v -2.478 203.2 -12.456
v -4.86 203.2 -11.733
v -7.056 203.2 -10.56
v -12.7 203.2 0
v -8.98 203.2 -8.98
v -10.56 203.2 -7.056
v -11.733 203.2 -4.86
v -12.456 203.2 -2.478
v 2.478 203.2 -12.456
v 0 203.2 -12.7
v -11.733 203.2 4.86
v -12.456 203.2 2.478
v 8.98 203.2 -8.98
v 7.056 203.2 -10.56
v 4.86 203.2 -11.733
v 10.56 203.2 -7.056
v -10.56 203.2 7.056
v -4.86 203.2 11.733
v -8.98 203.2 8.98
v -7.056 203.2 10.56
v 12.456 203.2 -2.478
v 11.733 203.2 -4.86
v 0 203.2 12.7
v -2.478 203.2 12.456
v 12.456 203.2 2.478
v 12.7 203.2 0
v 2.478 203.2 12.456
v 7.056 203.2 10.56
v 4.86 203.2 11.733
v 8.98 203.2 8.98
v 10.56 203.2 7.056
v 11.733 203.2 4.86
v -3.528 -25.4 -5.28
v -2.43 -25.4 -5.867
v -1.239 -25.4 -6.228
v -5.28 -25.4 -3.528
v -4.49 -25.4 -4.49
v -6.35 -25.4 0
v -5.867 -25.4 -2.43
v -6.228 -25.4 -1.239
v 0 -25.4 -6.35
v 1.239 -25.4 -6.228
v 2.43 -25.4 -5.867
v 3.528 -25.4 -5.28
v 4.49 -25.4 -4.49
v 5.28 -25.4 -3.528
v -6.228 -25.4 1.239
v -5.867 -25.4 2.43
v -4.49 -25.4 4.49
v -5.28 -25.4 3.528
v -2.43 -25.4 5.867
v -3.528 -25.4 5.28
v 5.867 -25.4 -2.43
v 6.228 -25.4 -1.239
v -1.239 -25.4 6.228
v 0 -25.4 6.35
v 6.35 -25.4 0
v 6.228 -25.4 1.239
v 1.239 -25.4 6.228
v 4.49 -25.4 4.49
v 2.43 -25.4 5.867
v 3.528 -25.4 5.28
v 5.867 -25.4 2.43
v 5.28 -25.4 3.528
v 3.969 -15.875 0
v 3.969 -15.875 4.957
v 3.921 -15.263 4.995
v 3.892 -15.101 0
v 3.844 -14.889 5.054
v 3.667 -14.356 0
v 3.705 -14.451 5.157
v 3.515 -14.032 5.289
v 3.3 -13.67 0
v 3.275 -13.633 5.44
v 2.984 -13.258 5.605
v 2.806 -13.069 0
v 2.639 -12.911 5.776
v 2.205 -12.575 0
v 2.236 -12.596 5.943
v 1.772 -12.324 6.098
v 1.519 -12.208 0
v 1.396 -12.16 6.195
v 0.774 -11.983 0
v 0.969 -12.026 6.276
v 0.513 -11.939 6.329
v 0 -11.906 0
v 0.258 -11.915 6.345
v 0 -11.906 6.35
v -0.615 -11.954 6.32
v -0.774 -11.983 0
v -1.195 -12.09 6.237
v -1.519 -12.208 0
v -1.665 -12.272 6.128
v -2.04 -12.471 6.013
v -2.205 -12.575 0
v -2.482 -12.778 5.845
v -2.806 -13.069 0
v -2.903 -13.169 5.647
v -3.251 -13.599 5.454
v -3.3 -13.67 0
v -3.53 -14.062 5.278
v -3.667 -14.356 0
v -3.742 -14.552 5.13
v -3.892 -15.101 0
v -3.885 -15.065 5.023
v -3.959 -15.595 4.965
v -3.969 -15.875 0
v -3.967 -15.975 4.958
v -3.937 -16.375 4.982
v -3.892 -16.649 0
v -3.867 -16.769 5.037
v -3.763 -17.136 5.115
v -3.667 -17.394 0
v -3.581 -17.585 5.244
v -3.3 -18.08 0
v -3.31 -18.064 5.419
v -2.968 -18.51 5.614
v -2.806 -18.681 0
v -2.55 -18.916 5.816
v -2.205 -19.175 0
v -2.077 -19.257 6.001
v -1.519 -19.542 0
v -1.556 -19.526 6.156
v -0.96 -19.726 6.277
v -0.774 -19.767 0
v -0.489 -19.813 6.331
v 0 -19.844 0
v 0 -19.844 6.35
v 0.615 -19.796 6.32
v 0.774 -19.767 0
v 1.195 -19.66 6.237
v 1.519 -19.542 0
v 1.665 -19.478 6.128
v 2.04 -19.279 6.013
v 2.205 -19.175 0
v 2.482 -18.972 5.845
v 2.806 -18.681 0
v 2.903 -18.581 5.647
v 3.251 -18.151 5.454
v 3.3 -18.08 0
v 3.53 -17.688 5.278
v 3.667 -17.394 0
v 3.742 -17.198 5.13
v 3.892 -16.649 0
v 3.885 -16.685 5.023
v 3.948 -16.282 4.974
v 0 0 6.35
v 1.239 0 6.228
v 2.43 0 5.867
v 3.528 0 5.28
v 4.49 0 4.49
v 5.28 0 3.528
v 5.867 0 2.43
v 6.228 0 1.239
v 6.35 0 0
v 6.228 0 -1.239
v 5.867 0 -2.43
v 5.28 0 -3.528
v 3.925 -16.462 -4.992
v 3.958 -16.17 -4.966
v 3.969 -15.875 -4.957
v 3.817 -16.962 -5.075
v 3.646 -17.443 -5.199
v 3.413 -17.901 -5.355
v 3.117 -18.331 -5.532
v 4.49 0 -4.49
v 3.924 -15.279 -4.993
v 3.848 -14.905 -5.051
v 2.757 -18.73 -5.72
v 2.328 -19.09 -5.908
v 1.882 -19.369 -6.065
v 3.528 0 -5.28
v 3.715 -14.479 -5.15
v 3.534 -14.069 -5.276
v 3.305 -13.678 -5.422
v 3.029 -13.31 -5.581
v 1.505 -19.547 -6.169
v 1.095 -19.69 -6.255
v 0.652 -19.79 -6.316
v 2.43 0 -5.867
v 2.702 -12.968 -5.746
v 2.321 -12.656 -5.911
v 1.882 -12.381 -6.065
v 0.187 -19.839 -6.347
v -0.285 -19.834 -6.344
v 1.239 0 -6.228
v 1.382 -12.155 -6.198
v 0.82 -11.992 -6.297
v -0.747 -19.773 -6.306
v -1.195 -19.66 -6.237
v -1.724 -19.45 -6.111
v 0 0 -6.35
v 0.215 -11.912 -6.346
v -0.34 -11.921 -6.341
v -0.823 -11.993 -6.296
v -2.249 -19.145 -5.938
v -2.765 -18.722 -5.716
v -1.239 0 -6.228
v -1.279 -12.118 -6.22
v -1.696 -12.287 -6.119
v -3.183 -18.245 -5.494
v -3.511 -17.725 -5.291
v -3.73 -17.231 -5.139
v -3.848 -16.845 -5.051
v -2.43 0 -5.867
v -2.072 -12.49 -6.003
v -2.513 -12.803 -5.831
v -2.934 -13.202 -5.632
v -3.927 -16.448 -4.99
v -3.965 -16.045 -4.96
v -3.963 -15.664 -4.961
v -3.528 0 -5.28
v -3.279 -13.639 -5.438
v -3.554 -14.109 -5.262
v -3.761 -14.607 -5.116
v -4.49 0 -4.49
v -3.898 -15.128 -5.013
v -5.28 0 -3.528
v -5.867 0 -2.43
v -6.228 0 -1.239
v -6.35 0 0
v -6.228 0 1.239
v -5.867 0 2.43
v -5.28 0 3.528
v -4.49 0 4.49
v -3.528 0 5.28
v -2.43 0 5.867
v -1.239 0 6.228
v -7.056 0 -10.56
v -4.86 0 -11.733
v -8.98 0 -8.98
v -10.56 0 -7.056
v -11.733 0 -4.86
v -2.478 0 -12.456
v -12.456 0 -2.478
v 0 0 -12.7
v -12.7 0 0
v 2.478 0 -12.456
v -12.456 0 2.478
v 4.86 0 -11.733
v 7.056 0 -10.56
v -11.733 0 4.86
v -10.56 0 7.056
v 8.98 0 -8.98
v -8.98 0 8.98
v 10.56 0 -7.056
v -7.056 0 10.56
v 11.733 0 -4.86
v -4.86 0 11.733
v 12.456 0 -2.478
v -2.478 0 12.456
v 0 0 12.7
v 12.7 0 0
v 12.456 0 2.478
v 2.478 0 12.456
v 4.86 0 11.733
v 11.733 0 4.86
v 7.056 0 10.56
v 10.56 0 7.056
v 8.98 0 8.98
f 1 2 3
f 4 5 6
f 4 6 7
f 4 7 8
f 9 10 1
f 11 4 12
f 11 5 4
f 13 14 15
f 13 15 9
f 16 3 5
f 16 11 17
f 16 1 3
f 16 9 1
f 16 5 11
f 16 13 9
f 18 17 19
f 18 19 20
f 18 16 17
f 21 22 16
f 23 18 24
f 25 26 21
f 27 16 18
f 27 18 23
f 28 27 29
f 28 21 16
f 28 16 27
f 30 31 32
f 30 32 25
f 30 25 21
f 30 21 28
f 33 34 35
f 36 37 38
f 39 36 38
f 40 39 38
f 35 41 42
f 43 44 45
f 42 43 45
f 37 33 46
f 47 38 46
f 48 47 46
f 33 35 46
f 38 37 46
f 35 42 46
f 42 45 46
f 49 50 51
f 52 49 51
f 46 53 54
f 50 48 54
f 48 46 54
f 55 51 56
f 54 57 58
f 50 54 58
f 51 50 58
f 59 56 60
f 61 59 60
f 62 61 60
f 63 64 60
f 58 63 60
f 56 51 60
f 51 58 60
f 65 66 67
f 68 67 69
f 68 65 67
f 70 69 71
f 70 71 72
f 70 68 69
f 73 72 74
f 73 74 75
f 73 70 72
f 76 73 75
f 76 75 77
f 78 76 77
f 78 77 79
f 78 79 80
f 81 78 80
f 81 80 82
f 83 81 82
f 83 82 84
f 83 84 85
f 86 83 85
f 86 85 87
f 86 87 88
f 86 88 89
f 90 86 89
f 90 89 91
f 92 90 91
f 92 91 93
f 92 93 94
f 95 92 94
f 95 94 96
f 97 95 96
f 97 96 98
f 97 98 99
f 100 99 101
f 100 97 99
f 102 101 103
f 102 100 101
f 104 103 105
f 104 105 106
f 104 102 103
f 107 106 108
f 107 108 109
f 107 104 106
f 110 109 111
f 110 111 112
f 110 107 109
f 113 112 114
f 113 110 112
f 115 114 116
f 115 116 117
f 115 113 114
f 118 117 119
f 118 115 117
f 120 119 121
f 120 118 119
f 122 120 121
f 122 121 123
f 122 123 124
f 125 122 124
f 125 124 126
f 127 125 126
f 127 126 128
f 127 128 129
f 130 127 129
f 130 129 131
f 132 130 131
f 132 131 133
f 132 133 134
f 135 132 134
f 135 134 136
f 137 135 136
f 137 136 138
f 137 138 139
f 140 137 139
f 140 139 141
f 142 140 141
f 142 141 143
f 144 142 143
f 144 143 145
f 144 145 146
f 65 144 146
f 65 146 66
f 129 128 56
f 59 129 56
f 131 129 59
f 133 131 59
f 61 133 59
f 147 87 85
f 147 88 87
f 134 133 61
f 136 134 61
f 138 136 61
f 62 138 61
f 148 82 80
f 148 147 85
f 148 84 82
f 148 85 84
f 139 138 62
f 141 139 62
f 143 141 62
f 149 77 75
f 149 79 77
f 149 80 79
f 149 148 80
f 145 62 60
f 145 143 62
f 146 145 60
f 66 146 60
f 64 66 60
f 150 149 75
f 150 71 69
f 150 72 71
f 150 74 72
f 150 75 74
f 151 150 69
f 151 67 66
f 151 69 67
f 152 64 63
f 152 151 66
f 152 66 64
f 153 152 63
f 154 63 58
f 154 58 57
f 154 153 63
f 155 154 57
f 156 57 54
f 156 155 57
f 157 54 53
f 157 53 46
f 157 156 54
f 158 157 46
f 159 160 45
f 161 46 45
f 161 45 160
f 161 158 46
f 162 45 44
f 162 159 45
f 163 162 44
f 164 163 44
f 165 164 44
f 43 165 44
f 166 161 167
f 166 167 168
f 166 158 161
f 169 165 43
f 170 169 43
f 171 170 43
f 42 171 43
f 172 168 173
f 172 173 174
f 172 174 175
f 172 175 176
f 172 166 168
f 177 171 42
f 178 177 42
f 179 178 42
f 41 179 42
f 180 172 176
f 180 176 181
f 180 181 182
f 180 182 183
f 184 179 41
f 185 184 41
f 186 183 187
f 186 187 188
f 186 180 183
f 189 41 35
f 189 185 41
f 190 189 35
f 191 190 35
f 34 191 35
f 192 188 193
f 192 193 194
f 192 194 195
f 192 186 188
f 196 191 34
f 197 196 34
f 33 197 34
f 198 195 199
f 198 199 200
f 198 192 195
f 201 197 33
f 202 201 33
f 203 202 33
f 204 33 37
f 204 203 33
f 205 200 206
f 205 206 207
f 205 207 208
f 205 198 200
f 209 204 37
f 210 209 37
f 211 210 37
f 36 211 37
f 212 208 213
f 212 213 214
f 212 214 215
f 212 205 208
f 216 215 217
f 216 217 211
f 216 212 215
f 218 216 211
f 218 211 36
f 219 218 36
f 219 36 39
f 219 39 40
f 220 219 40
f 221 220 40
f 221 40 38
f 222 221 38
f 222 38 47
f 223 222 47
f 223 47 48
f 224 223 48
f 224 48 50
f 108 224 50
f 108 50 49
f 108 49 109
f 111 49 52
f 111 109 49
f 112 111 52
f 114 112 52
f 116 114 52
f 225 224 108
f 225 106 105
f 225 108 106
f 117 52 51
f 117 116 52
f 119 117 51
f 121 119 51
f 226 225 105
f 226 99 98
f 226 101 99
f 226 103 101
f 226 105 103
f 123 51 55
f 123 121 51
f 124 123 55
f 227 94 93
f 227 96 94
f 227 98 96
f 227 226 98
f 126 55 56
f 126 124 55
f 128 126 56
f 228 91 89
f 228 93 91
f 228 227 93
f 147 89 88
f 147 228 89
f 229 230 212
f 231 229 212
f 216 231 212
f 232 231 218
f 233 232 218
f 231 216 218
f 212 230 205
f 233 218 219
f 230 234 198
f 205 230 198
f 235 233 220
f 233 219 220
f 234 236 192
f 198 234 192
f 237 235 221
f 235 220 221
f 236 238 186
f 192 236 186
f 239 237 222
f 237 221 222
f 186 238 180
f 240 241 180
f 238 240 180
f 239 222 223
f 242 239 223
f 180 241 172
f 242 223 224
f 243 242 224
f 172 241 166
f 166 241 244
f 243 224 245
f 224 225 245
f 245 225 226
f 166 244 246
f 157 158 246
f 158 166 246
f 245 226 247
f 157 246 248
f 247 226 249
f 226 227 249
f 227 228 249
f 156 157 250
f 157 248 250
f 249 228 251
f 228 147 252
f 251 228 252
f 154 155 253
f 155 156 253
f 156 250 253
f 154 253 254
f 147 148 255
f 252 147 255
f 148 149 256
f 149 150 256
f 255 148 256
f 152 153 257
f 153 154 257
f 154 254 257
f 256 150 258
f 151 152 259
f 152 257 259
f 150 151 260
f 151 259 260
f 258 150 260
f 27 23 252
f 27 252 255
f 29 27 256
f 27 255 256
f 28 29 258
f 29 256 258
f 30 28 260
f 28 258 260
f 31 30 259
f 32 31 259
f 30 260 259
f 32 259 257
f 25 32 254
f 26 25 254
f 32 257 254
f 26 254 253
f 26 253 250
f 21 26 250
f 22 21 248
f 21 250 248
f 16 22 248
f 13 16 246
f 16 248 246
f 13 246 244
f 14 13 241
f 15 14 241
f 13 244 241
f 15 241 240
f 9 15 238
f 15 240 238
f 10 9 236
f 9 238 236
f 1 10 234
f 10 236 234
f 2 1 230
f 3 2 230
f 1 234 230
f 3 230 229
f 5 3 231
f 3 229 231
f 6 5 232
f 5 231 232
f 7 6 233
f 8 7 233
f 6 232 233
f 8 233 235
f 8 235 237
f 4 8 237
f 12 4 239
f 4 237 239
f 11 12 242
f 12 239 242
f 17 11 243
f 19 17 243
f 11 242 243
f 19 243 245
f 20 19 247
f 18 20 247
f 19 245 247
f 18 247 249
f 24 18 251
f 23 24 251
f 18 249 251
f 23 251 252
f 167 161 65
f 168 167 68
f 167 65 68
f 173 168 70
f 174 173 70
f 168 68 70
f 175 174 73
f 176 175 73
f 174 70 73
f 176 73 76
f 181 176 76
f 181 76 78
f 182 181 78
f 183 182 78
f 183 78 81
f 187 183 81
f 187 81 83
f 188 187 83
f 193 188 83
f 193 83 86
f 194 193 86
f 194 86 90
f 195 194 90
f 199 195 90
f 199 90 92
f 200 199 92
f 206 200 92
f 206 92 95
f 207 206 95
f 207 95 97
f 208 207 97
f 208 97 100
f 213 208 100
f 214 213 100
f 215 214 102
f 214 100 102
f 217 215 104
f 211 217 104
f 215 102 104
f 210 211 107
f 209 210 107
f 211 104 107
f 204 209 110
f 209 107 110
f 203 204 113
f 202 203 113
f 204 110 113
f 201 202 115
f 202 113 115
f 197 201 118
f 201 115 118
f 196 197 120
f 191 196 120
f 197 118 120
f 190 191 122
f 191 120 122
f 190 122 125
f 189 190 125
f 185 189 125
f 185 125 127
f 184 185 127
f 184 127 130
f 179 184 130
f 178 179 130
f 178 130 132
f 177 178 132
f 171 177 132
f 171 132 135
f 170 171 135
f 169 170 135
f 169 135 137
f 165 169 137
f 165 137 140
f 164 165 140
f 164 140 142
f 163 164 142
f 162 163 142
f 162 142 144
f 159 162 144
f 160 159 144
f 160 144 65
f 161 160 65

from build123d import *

# Parameters (mm, degrees)
SKETCH1_R               = 12.7
BOSS_EXTRUDE1_DEPTH     = 203.2
SKETCH1_3_R             = 6.35
BOSS_EXTRUDE2_DEPTH     = 25.4
CUT_EXTRUDE2_DEPTH      = 204.992205733
CUT_EXTRUDE2_DEPTH_BACK = 204.992205733
SKETCH3_R               = 3.96875


with BuildPart() as part:
    # Sketch1 → Boss-Extrude1 (new body)
    with BuildSketch(Plane(origin=(0, 0, 0), x_dir=(1, 0, 0), z_dir=(0, 1, 0))):
        Circle(SKETCH1_R)
    extrude(amount=BOSS_EXTRUDE1_DEPTH)

    # Sketch1<3> → Boss-Extrude2 (add)
    with BuildSketch(Plane(origin=(0, 0, 0), x_dir=(1, 0, 0), z_dir=(0, 1, 0))):
        Circle(SKETCH1_3_R)
    extrude(amount=-BOSS_EXTRUDE2_DEPTH)

    # Sketch3 → Cut-Extrude2 (cut, two sides: drawn at the far end of the back side and taken through both)
    with BuildSketch(Plane.XY.offset(-CUT_EXTRUDE2_DEPTH_BACK)):
        with Locations((0, -15.875)):
            Circle(SKETCH3_R)
    extrude(amount=CUT_EXTRUDE2_DEPTH + CUT_EXTRUDE2_DEPTH_BACK, mode=Mode.SUBTRACT)


solid = part.part
